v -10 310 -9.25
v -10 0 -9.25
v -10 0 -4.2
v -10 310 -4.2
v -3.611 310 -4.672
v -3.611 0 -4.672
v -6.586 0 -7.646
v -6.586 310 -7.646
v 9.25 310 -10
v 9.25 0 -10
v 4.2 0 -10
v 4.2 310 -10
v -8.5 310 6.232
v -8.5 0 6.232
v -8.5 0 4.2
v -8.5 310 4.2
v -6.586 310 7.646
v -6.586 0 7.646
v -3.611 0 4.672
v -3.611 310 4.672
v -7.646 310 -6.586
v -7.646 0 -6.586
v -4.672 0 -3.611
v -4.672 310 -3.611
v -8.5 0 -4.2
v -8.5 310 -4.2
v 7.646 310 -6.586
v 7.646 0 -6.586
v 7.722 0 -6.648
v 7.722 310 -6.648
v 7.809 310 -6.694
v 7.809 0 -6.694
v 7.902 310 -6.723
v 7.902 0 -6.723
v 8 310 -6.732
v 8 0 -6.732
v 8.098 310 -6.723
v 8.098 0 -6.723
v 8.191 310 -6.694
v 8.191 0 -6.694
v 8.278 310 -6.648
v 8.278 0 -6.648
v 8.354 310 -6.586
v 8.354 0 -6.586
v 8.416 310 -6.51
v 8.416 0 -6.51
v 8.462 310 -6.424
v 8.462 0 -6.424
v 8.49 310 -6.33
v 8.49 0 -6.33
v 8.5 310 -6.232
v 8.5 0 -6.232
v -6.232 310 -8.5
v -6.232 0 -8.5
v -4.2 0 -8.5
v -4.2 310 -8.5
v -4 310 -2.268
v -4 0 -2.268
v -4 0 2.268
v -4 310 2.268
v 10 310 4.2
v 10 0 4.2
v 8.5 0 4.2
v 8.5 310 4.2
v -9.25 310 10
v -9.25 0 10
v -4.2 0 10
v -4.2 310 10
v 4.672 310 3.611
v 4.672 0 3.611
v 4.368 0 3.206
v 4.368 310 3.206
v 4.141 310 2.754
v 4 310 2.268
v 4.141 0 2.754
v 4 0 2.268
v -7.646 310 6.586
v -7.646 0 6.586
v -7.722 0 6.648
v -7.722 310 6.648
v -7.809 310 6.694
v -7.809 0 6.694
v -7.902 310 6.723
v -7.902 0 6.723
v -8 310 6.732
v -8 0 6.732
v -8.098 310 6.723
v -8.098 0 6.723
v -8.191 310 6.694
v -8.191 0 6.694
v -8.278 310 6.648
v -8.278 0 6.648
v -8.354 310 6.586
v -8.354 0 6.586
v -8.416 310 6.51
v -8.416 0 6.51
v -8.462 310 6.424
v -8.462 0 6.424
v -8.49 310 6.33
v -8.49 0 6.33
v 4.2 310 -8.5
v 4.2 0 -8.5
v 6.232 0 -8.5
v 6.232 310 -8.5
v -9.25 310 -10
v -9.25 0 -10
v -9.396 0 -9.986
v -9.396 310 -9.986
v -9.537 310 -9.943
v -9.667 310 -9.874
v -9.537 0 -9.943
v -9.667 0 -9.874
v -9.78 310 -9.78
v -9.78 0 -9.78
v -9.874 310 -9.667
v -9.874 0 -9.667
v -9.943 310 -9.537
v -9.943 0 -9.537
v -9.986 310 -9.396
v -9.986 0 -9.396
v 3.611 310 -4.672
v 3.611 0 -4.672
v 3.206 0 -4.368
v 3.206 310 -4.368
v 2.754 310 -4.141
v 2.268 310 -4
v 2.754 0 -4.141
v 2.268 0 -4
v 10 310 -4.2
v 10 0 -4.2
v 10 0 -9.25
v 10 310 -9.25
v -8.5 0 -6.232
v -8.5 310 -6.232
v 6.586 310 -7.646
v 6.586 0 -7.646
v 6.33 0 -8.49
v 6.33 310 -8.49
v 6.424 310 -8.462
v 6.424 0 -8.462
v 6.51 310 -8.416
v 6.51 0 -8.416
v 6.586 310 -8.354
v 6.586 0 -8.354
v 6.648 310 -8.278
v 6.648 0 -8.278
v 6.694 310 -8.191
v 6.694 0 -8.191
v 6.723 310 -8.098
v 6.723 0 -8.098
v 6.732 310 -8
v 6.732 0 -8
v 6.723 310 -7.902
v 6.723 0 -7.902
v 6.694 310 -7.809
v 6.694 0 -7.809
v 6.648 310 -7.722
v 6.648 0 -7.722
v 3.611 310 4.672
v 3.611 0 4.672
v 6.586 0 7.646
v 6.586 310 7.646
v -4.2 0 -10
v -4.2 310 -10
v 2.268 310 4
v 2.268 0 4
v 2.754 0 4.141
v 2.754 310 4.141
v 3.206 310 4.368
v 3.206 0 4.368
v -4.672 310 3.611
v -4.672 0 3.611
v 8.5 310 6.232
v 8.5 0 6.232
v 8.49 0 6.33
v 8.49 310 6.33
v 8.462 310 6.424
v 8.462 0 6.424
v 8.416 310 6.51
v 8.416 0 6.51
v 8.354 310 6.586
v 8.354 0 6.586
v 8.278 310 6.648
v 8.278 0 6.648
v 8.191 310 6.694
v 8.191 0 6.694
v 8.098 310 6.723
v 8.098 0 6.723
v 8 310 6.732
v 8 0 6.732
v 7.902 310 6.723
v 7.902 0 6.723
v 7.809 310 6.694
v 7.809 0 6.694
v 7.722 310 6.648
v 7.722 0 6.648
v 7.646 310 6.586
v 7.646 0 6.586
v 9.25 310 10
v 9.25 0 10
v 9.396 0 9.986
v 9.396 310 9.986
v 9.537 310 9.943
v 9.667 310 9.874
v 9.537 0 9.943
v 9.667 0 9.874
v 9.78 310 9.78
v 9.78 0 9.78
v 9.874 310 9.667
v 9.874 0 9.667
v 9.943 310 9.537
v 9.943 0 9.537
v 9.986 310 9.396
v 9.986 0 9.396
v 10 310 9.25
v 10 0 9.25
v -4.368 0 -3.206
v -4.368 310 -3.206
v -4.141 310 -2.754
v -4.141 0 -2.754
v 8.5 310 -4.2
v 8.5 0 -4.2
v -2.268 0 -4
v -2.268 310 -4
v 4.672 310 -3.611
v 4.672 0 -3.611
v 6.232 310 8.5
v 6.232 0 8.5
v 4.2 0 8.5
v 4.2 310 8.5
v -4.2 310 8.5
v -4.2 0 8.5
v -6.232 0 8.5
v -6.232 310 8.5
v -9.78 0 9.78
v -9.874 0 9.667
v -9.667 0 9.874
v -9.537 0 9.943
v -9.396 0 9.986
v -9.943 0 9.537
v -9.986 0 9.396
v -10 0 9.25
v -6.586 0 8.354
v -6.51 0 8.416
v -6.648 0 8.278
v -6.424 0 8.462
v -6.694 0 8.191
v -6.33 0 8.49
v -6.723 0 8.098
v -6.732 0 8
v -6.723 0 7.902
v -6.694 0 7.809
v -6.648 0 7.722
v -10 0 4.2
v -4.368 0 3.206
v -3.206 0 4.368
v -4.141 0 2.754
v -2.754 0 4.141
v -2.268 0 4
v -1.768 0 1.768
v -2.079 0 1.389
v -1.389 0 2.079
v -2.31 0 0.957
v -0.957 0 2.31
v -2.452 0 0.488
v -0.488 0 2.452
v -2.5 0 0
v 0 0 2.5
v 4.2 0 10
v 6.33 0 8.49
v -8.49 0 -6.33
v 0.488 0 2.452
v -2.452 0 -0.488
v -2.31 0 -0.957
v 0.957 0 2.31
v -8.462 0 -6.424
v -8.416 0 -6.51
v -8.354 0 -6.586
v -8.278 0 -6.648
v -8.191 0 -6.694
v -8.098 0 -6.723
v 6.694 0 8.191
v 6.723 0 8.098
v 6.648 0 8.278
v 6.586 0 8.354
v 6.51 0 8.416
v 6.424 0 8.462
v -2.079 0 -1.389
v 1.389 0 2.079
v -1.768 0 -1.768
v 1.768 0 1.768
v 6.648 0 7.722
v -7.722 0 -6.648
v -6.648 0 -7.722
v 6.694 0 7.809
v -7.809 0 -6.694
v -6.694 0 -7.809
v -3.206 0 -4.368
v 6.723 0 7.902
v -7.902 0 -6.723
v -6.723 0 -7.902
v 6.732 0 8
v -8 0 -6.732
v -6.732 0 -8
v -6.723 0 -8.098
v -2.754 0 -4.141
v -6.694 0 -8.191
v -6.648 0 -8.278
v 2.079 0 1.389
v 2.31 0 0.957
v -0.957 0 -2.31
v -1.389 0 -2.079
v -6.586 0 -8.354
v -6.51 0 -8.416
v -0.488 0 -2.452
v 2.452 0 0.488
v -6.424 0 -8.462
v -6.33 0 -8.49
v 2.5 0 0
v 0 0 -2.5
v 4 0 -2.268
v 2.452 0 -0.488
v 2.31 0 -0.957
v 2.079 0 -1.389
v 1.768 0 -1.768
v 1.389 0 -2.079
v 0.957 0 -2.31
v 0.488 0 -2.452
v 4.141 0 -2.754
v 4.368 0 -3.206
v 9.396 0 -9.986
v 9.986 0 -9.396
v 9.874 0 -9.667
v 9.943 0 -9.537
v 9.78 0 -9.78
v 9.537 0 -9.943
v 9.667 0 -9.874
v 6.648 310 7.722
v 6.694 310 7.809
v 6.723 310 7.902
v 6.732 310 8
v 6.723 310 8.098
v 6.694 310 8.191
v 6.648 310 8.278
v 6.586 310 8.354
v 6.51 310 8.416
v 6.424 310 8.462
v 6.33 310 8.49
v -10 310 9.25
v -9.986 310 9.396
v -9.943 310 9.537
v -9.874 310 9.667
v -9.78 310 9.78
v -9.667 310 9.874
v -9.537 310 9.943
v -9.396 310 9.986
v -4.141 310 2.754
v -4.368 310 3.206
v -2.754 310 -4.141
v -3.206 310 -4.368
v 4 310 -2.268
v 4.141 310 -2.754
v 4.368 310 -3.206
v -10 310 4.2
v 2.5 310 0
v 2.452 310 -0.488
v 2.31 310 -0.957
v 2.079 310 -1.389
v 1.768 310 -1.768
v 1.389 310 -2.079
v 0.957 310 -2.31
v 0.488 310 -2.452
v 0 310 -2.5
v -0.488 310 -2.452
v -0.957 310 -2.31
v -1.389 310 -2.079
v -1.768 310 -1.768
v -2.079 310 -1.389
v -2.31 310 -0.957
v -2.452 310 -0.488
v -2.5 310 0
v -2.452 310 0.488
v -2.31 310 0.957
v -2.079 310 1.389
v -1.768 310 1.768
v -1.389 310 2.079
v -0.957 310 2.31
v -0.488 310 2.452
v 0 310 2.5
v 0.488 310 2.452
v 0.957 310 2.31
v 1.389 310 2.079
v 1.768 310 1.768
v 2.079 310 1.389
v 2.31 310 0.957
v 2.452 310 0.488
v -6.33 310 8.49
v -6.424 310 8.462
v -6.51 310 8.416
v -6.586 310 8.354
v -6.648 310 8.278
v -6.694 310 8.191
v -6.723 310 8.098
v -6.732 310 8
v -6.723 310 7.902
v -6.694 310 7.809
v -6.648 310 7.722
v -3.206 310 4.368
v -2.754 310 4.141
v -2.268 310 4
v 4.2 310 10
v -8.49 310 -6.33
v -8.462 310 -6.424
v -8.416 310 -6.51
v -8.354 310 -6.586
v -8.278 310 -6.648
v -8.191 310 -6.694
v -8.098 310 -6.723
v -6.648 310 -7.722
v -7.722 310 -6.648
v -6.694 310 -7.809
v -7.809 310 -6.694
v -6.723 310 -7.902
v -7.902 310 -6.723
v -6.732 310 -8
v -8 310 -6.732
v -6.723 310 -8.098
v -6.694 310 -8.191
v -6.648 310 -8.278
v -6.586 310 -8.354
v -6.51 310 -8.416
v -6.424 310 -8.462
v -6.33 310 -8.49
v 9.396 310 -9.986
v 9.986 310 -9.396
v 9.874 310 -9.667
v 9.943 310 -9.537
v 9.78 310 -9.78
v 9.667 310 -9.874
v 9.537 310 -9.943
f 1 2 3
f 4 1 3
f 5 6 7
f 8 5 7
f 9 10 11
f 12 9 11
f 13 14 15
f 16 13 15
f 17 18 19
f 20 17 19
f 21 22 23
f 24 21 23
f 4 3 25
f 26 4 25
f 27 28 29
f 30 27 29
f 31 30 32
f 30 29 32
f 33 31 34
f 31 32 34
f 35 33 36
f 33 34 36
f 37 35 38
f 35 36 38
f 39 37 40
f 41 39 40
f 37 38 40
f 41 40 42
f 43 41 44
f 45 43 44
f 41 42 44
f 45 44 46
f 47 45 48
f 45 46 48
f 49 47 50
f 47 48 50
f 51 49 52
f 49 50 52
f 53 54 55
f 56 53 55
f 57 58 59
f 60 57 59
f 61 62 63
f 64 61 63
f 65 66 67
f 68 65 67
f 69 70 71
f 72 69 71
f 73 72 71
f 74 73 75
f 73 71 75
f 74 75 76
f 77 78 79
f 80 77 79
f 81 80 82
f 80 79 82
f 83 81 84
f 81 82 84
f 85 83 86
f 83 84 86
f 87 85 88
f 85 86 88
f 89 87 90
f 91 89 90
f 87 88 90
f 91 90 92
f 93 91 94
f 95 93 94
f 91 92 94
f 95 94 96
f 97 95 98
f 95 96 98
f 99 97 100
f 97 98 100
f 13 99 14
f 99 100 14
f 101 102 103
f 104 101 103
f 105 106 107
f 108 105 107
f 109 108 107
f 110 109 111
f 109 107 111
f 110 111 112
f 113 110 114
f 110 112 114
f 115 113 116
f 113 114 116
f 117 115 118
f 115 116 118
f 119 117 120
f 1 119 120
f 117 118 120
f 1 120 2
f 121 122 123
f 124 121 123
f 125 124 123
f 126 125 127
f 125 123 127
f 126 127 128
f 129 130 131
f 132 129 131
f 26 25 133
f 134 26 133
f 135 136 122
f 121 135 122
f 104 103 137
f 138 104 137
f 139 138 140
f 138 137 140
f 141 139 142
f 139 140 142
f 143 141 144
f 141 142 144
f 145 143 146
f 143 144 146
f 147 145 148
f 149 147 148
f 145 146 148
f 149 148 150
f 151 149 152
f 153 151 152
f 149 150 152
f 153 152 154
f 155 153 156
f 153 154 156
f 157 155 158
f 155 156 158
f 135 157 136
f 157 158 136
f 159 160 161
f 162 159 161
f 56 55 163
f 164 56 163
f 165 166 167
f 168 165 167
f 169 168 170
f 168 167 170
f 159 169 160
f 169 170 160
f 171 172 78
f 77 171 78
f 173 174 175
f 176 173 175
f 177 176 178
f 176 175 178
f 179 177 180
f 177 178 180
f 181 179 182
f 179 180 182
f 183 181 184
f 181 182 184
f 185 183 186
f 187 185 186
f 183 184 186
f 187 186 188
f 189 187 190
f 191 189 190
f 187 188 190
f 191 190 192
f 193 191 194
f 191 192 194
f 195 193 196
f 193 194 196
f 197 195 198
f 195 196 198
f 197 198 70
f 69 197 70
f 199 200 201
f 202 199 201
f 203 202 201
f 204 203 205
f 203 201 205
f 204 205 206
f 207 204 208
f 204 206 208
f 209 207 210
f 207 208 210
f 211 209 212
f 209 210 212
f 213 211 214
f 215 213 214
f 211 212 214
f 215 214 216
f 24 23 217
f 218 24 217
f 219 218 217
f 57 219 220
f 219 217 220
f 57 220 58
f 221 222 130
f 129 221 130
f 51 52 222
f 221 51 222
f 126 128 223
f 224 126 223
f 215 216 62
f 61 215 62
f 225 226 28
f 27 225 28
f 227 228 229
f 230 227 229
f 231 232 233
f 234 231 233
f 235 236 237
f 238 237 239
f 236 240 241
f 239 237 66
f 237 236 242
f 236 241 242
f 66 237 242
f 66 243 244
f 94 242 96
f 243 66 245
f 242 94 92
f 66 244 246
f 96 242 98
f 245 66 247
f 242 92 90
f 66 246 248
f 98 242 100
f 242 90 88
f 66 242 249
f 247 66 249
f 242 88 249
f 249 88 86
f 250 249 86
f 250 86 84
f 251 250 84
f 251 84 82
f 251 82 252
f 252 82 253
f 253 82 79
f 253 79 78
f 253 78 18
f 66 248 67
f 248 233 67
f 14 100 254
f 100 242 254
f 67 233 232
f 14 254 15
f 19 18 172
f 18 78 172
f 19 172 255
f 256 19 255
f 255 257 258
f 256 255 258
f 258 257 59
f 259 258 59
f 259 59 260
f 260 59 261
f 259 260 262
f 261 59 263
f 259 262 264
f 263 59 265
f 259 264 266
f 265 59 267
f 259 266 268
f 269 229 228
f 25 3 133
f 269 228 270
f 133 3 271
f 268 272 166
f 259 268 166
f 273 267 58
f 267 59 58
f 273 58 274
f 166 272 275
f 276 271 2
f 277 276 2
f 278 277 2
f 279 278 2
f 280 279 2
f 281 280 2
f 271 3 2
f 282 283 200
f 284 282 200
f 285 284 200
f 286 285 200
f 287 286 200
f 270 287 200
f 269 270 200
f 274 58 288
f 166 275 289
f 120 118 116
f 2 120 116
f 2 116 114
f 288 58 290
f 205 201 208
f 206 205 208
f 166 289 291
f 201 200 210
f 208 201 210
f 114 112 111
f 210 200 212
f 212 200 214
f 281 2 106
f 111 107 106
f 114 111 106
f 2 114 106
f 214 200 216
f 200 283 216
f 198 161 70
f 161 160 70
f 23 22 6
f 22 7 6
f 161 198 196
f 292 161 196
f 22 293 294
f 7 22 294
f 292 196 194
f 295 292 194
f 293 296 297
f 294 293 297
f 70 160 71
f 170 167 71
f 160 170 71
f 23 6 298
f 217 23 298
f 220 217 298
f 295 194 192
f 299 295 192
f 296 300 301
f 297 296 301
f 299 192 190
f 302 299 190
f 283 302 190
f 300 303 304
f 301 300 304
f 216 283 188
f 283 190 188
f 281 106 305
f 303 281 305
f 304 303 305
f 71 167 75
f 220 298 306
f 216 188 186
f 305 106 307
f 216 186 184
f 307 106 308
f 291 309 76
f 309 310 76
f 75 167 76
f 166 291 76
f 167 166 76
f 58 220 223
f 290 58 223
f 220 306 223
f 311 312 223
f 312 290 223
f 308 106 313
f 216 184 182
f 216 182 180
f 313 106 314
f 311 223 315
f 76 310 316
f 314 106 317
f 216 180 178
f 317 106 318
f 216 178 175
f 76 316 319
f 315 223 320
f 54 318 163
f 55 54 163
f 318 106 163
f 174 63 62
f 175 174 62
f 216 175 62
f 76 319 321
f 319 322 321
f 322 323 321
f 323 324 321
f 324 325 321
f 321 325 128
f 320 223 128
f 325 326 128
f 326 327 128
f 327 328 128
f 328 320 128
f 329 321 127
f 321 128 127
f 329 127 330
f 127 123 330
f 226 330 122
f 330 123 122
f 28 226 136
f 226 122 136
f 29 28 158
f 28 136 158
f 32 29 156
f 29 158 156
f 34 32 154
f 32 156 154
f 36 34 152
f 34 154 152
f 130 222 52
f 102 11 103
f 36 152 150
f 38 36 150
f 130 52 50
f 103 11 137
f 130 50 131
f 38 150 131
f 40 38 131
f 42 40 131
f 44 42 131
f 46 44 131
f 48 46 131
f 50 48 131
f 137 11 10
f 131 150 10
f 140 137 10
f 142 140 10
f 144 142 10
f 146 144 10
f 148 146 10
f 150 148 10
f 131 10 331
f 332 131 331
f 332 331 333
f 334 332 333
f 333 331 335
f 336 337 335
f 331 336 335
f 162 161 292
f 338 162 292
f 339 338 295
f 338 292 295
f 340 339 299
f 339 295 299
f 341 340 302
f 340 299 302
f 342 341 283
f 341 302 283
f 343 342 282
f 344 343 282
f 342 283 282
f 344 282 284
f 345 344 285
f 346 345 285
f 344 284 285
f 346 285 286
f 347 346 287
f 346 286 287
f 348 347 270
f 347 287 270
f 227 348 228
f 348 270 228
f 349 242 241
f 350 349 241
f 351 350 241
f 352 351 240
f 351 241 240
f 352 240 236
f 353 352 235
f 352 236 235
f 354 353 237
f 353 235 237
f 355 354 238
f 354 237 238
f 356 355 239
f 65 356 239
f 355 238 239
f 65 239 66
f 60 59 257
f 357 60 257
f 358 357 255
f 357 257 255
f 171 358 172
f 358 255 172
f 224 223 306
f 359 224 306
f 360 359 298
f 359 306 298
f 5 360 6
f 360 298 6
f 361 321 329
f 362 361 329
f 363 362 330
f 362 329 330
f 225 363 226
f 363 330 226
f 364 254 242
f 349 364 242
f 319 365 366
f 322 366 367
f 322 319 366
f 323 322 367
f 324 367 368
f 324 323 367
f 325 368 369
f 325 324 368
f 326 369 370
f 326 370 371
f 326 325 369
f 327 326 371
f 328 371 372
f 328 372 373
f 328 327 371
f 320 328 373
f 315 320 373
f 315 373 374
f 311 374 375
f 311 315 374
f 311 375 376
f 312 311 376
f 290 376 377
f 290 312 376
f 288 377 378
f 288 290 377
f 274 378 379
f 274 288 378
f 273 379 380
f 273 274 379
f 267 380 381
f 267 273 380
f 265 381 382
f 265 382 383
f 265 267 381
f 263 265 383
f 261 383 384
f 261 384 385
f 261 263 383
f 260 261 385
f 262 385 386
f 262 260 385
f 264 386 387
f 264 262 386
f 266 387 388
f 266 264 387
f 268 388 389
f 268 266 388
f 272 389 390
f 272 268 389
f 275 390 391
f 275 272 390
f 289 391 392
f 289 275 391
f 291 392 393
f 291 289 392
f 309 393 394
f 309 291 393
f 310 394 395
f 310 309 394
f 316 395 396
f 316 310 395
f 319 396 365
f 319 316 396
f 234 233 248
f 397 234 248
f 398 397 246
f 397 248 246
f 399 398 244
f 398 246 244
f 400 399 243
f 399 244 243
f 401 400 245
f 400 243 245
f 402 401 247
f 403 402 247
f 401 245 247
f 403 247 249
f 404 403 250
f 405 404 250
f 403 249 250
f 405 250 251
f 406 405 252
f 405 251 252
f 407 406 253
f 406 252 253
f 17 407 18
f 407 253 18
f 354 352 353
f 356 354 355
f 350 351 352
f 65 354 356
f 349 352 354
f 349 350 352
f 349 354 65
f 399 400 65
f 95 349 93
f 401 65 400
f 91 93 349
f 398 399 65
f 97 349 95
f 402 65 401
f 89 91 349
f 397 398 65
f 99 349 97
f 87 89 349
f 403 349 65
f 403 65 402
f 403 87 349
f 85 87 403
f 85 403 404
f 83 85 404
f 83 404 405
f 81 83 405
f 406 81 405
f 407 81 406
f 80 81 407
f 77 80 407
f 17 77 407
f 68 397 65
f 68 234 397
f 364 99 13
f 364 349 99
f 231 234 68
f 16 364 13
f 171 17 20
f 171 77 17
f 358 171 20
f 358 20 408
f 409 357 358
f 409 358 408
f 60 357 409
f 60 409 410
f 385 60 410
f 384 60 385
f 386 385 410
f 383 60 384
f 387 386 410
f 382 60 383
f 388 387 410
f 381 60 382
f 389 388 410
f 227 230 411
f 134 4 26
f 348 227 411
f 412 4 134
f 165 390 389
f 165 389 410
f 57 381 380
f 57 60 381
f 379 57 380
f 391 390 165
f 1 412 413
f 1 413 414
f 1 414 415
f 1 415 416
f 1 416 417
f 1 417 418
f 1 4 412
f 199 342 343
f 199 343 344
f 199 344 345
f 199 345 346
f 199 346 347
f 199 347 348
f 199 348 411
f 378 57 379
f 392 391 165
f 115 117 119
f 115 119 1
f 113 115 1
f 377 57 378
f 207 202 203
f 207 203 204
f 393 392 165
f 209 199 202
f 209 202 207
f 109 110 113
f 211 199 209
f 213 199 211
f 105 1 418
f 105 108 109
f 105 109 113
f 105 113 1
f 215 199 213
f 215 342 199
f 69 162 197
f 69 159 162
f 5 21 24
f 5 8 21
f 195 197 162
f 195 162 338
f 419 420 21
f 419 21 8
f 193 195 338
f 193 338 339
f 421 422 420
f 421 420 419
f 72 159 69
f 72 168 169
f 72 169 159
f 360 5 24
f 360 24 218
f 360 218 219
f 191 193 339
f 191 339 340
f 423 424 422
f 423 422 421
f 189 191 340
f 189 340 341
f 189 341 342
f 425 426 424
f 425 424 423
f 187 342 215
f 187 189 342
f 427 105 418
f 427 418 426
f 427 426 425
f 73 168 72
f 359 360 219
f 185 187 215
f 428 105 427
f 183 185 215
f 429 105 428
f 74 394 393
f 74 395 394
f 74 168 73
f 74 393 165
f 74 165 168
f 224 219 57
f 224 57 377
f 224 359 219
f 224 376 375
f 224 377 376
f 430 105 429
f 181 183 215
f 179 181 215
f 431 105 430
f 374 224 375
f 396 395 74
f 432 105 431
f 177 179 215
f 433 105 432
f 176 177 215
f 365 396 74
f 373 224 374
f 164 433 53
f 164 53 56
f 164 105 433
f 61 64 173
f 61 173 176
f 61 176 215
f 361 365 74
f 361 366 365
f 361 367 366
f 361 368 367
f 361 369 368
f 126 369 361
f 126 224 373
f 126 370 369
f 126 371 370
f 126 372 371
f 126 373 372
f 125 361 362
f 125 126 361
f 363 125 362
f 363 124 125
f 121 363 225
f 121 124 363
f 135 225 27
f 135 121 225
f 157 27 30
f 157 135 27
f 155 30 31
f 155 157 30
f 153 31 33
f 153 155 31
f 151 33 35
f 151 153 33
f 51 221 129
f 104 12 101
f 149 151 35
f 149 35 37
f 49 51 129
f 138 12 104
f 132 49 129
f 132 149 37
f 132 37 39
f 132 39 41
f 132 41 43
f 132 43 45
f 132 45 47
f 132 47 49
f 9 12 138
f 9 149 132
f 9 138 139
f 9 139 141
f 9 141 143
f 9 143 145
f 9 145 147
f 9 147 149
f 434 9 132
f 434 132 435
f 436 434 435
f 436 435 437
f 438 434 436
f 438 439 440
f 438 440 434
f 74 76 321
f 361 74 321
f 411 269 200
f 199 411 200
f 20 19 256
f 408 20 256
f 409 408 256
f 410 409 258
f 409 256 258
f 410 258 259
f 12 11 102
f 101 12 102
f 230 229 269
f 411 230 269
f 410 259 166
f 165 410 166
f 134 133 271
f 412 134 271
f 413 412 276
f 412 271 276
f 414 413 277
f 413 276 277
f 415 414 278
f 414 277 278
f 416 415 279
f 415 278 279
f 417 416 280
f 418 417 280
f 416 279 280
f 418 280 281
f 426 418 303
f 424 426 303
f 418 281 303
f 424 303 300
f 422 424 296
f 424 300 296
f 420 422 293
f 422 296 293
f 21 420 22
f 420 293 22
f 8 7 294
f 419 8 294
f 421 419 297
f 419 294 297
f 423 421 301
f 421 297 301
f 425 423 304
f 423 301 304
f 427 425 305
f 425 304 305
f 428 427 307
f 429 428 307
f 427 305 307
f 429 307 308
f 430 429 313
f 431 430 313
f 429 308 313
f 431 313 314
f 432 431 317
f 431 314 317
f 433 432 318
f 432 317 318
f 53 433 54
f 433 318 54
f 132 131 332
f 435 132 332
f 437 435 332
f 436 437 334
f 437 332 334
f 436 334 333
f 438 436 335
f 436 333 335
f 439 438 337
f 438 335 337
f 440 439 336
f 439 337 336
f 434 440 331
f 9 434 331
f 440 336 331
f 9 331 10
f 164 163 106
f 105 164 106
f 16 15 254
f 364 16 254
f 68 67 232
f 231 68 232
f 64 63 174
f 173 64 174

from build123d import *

# Parameters (mm, degrees)
SKETCH1_R           = 2.5
BOSS_EXTRUDE1_DEPTH = 310


with BuildPart() as part:
    # Sketch1 → Boss-Extrude1 (new body)
    with BuildSketch(Plane(origin=(0, 0, 0), x_dir=(1, 0, 0), z_dir=(0, 1, 0))):
        with BuildLine():
            Line((-3.610984523, 4.671644695), (-6.585786438, 7.646446609))
            ThreePointArc((-6.585786438, 7.646446609), (-6.694172813, 8.191341716), (-6.232233047, 8.5))
            Line((-6.232233047, 8.5), (-4.2, 8.5))
            Line((-4.2, 8.5), (-4.2, 10))
            Line((-4.2, 10), (-9.25, 10))
            ThreePointArc((-9.25, 10), (-9.780330086, 9.780330086), (-10, 9.25))
            Line((-10, 9.25), (-10, 4.2))
            Line((-10, 4.2), (-8.5, 4.2))
            Line((-8.5, 4.2), (-8.5, 6.232233047))
            ThreePointArc((-8.5, 6.232233047), (-8.191341716, 6.694172813), (-7.646446609, 6.585786438))
            Line((-7.646446609, 6.585786438), (-4.671644695, 3.610984523))
            ThreePointArc((-4.671644695, 3.610984523), (-4.244383234, 2.985253206), (-4, 2.268058063))
            Line((-4, 2.268058063), (-4, -2.268058063))
            ThreePointArc((-4, -2.268058063), (-4.244383234, -2.985253206), (-4.671644695, -3.610984523))
            Line((-4.671644695, -3.610984523), (-7.646446609, -6.585786438))
            ThreePointArc((-7.646446609, -6.585786438), (-8.191341716, -6.694172813), (-8.5, -6.232233047))
            Line((-8.5, -6.232233047), (-8.5, -4.2))
            Line((-8.5, -4.2), (-10, -4.2))
            Line((-10, -4.2), (-10, -9.25))
            ThreePointArc((-10, -9.25), (-9.780330086, -9.780330086), (-9.25, -10))
            Line((-9.25, -10), (-4.2, -10))
            Line((-4.2, -10), (-4.2, -8.5))
            Line((-4.2, -8.5), (-6.232233047, -8.5))
            ThreePointArc((-6.232233047, -8.5), (-6.694172813, -8.191341716), (-6.585786438, -7.646446609))
            Line((-6.585786438, -7.646446609), (-3.610984523, -4.671644695))
            ThreePointArc((-3.610984523, -4.671644695), (-2.985253206, -4.244383234), (-2.268058063, -4))
            Line((-2.268058063, -4), (2.268058063, -4))
            ThreePointArc((2.268058063, -4), (2.985253206, -4.244383234), (3.610984523, -4.671644695))
            Line((3.610984523, -4.671644695), (6.585786438, -7.646446609))
            ThreePointArc((6.585786438, -7.646446609), (6.694172813, -8.191341716), (6.232233047, -8.5))
            Line((6.232233047, -8.5), (4.2, -8.5))
            Line((4.2, -8.5), (4.2, -10))
            Line((4.2, -10), (9.25, -10))
            ThreePointArc((9.25, -10), (9.780330086, -9.780330086), (10, -9.25))
            Line((10, -9.25), (10, -4.2))
            Line((10, -4.2), (8.5, -4.2))
            Line((8.5, -4.2), (8.5, -6.232233047))
            ThreePointArc((8.5, -6.232233047), (8.191341716, -6.694172813), (7.646446609, -6.585786438))
            Line((7.646446609, -6.585786438), (4.671644695, -3.610984523))
            ThreePointArc((4.671644695, -3.610984523), (4.244383234, -2.985253206), (4, -2.268058063))
            Line((4, -2.268058063), (4, 2.268058063))
            ThreePointArc((4, 2.268058063), (4.244383234, 2.985253206), (4.671644695, 3.610984523))
            Line((4.671644695, 3.610984523), (7.646446609, 6.585786438))
            ThreePointArc((7.646446609, 6.585786438), (8.191341716, 6.694172813), (8.5, 6.232233047))
            Line((8.5, 6.232233047), (8.5, 4.2))
            Line((8.5, 4.2), (10, 4.2))
            Line((10, 4.2), (10, 9.25))
            ThreePointArc((10, 9.25), (9.780330086, 9.780330086), (9.25, 10))
            Line((9.25, 10), (4.2, 10))
            Line((4.2, 10), (4.2, 8.5))
            Line((4.2, 8.5), (6.232233047, 8.5))
            ThreePointArc((6.232233047, 8.5), (6.694172813, 8.191341716), (6.585786438, 7.646446609))
            Line((6.585786438, 7.646446609), (3.610984523, 4.671644695))
            ThreePointArc((3.610984523, 4.671644695), (2.985253206, 4.244383234), (2.268058063, 4))
            Line((2.268058063, 4), (-2.268058063, 4))
            ThreePointArc((-2.268058063, 4), (-2.985253206, 4.244383234), (-3.610984523, 4.671644695))
        make_face()
        Circle(SKETCH1_R, mode=Mode.SUBTRACT)
    extrude(amount=BOSS_EXTRUDE1_DEPTH)


solid = part.part
